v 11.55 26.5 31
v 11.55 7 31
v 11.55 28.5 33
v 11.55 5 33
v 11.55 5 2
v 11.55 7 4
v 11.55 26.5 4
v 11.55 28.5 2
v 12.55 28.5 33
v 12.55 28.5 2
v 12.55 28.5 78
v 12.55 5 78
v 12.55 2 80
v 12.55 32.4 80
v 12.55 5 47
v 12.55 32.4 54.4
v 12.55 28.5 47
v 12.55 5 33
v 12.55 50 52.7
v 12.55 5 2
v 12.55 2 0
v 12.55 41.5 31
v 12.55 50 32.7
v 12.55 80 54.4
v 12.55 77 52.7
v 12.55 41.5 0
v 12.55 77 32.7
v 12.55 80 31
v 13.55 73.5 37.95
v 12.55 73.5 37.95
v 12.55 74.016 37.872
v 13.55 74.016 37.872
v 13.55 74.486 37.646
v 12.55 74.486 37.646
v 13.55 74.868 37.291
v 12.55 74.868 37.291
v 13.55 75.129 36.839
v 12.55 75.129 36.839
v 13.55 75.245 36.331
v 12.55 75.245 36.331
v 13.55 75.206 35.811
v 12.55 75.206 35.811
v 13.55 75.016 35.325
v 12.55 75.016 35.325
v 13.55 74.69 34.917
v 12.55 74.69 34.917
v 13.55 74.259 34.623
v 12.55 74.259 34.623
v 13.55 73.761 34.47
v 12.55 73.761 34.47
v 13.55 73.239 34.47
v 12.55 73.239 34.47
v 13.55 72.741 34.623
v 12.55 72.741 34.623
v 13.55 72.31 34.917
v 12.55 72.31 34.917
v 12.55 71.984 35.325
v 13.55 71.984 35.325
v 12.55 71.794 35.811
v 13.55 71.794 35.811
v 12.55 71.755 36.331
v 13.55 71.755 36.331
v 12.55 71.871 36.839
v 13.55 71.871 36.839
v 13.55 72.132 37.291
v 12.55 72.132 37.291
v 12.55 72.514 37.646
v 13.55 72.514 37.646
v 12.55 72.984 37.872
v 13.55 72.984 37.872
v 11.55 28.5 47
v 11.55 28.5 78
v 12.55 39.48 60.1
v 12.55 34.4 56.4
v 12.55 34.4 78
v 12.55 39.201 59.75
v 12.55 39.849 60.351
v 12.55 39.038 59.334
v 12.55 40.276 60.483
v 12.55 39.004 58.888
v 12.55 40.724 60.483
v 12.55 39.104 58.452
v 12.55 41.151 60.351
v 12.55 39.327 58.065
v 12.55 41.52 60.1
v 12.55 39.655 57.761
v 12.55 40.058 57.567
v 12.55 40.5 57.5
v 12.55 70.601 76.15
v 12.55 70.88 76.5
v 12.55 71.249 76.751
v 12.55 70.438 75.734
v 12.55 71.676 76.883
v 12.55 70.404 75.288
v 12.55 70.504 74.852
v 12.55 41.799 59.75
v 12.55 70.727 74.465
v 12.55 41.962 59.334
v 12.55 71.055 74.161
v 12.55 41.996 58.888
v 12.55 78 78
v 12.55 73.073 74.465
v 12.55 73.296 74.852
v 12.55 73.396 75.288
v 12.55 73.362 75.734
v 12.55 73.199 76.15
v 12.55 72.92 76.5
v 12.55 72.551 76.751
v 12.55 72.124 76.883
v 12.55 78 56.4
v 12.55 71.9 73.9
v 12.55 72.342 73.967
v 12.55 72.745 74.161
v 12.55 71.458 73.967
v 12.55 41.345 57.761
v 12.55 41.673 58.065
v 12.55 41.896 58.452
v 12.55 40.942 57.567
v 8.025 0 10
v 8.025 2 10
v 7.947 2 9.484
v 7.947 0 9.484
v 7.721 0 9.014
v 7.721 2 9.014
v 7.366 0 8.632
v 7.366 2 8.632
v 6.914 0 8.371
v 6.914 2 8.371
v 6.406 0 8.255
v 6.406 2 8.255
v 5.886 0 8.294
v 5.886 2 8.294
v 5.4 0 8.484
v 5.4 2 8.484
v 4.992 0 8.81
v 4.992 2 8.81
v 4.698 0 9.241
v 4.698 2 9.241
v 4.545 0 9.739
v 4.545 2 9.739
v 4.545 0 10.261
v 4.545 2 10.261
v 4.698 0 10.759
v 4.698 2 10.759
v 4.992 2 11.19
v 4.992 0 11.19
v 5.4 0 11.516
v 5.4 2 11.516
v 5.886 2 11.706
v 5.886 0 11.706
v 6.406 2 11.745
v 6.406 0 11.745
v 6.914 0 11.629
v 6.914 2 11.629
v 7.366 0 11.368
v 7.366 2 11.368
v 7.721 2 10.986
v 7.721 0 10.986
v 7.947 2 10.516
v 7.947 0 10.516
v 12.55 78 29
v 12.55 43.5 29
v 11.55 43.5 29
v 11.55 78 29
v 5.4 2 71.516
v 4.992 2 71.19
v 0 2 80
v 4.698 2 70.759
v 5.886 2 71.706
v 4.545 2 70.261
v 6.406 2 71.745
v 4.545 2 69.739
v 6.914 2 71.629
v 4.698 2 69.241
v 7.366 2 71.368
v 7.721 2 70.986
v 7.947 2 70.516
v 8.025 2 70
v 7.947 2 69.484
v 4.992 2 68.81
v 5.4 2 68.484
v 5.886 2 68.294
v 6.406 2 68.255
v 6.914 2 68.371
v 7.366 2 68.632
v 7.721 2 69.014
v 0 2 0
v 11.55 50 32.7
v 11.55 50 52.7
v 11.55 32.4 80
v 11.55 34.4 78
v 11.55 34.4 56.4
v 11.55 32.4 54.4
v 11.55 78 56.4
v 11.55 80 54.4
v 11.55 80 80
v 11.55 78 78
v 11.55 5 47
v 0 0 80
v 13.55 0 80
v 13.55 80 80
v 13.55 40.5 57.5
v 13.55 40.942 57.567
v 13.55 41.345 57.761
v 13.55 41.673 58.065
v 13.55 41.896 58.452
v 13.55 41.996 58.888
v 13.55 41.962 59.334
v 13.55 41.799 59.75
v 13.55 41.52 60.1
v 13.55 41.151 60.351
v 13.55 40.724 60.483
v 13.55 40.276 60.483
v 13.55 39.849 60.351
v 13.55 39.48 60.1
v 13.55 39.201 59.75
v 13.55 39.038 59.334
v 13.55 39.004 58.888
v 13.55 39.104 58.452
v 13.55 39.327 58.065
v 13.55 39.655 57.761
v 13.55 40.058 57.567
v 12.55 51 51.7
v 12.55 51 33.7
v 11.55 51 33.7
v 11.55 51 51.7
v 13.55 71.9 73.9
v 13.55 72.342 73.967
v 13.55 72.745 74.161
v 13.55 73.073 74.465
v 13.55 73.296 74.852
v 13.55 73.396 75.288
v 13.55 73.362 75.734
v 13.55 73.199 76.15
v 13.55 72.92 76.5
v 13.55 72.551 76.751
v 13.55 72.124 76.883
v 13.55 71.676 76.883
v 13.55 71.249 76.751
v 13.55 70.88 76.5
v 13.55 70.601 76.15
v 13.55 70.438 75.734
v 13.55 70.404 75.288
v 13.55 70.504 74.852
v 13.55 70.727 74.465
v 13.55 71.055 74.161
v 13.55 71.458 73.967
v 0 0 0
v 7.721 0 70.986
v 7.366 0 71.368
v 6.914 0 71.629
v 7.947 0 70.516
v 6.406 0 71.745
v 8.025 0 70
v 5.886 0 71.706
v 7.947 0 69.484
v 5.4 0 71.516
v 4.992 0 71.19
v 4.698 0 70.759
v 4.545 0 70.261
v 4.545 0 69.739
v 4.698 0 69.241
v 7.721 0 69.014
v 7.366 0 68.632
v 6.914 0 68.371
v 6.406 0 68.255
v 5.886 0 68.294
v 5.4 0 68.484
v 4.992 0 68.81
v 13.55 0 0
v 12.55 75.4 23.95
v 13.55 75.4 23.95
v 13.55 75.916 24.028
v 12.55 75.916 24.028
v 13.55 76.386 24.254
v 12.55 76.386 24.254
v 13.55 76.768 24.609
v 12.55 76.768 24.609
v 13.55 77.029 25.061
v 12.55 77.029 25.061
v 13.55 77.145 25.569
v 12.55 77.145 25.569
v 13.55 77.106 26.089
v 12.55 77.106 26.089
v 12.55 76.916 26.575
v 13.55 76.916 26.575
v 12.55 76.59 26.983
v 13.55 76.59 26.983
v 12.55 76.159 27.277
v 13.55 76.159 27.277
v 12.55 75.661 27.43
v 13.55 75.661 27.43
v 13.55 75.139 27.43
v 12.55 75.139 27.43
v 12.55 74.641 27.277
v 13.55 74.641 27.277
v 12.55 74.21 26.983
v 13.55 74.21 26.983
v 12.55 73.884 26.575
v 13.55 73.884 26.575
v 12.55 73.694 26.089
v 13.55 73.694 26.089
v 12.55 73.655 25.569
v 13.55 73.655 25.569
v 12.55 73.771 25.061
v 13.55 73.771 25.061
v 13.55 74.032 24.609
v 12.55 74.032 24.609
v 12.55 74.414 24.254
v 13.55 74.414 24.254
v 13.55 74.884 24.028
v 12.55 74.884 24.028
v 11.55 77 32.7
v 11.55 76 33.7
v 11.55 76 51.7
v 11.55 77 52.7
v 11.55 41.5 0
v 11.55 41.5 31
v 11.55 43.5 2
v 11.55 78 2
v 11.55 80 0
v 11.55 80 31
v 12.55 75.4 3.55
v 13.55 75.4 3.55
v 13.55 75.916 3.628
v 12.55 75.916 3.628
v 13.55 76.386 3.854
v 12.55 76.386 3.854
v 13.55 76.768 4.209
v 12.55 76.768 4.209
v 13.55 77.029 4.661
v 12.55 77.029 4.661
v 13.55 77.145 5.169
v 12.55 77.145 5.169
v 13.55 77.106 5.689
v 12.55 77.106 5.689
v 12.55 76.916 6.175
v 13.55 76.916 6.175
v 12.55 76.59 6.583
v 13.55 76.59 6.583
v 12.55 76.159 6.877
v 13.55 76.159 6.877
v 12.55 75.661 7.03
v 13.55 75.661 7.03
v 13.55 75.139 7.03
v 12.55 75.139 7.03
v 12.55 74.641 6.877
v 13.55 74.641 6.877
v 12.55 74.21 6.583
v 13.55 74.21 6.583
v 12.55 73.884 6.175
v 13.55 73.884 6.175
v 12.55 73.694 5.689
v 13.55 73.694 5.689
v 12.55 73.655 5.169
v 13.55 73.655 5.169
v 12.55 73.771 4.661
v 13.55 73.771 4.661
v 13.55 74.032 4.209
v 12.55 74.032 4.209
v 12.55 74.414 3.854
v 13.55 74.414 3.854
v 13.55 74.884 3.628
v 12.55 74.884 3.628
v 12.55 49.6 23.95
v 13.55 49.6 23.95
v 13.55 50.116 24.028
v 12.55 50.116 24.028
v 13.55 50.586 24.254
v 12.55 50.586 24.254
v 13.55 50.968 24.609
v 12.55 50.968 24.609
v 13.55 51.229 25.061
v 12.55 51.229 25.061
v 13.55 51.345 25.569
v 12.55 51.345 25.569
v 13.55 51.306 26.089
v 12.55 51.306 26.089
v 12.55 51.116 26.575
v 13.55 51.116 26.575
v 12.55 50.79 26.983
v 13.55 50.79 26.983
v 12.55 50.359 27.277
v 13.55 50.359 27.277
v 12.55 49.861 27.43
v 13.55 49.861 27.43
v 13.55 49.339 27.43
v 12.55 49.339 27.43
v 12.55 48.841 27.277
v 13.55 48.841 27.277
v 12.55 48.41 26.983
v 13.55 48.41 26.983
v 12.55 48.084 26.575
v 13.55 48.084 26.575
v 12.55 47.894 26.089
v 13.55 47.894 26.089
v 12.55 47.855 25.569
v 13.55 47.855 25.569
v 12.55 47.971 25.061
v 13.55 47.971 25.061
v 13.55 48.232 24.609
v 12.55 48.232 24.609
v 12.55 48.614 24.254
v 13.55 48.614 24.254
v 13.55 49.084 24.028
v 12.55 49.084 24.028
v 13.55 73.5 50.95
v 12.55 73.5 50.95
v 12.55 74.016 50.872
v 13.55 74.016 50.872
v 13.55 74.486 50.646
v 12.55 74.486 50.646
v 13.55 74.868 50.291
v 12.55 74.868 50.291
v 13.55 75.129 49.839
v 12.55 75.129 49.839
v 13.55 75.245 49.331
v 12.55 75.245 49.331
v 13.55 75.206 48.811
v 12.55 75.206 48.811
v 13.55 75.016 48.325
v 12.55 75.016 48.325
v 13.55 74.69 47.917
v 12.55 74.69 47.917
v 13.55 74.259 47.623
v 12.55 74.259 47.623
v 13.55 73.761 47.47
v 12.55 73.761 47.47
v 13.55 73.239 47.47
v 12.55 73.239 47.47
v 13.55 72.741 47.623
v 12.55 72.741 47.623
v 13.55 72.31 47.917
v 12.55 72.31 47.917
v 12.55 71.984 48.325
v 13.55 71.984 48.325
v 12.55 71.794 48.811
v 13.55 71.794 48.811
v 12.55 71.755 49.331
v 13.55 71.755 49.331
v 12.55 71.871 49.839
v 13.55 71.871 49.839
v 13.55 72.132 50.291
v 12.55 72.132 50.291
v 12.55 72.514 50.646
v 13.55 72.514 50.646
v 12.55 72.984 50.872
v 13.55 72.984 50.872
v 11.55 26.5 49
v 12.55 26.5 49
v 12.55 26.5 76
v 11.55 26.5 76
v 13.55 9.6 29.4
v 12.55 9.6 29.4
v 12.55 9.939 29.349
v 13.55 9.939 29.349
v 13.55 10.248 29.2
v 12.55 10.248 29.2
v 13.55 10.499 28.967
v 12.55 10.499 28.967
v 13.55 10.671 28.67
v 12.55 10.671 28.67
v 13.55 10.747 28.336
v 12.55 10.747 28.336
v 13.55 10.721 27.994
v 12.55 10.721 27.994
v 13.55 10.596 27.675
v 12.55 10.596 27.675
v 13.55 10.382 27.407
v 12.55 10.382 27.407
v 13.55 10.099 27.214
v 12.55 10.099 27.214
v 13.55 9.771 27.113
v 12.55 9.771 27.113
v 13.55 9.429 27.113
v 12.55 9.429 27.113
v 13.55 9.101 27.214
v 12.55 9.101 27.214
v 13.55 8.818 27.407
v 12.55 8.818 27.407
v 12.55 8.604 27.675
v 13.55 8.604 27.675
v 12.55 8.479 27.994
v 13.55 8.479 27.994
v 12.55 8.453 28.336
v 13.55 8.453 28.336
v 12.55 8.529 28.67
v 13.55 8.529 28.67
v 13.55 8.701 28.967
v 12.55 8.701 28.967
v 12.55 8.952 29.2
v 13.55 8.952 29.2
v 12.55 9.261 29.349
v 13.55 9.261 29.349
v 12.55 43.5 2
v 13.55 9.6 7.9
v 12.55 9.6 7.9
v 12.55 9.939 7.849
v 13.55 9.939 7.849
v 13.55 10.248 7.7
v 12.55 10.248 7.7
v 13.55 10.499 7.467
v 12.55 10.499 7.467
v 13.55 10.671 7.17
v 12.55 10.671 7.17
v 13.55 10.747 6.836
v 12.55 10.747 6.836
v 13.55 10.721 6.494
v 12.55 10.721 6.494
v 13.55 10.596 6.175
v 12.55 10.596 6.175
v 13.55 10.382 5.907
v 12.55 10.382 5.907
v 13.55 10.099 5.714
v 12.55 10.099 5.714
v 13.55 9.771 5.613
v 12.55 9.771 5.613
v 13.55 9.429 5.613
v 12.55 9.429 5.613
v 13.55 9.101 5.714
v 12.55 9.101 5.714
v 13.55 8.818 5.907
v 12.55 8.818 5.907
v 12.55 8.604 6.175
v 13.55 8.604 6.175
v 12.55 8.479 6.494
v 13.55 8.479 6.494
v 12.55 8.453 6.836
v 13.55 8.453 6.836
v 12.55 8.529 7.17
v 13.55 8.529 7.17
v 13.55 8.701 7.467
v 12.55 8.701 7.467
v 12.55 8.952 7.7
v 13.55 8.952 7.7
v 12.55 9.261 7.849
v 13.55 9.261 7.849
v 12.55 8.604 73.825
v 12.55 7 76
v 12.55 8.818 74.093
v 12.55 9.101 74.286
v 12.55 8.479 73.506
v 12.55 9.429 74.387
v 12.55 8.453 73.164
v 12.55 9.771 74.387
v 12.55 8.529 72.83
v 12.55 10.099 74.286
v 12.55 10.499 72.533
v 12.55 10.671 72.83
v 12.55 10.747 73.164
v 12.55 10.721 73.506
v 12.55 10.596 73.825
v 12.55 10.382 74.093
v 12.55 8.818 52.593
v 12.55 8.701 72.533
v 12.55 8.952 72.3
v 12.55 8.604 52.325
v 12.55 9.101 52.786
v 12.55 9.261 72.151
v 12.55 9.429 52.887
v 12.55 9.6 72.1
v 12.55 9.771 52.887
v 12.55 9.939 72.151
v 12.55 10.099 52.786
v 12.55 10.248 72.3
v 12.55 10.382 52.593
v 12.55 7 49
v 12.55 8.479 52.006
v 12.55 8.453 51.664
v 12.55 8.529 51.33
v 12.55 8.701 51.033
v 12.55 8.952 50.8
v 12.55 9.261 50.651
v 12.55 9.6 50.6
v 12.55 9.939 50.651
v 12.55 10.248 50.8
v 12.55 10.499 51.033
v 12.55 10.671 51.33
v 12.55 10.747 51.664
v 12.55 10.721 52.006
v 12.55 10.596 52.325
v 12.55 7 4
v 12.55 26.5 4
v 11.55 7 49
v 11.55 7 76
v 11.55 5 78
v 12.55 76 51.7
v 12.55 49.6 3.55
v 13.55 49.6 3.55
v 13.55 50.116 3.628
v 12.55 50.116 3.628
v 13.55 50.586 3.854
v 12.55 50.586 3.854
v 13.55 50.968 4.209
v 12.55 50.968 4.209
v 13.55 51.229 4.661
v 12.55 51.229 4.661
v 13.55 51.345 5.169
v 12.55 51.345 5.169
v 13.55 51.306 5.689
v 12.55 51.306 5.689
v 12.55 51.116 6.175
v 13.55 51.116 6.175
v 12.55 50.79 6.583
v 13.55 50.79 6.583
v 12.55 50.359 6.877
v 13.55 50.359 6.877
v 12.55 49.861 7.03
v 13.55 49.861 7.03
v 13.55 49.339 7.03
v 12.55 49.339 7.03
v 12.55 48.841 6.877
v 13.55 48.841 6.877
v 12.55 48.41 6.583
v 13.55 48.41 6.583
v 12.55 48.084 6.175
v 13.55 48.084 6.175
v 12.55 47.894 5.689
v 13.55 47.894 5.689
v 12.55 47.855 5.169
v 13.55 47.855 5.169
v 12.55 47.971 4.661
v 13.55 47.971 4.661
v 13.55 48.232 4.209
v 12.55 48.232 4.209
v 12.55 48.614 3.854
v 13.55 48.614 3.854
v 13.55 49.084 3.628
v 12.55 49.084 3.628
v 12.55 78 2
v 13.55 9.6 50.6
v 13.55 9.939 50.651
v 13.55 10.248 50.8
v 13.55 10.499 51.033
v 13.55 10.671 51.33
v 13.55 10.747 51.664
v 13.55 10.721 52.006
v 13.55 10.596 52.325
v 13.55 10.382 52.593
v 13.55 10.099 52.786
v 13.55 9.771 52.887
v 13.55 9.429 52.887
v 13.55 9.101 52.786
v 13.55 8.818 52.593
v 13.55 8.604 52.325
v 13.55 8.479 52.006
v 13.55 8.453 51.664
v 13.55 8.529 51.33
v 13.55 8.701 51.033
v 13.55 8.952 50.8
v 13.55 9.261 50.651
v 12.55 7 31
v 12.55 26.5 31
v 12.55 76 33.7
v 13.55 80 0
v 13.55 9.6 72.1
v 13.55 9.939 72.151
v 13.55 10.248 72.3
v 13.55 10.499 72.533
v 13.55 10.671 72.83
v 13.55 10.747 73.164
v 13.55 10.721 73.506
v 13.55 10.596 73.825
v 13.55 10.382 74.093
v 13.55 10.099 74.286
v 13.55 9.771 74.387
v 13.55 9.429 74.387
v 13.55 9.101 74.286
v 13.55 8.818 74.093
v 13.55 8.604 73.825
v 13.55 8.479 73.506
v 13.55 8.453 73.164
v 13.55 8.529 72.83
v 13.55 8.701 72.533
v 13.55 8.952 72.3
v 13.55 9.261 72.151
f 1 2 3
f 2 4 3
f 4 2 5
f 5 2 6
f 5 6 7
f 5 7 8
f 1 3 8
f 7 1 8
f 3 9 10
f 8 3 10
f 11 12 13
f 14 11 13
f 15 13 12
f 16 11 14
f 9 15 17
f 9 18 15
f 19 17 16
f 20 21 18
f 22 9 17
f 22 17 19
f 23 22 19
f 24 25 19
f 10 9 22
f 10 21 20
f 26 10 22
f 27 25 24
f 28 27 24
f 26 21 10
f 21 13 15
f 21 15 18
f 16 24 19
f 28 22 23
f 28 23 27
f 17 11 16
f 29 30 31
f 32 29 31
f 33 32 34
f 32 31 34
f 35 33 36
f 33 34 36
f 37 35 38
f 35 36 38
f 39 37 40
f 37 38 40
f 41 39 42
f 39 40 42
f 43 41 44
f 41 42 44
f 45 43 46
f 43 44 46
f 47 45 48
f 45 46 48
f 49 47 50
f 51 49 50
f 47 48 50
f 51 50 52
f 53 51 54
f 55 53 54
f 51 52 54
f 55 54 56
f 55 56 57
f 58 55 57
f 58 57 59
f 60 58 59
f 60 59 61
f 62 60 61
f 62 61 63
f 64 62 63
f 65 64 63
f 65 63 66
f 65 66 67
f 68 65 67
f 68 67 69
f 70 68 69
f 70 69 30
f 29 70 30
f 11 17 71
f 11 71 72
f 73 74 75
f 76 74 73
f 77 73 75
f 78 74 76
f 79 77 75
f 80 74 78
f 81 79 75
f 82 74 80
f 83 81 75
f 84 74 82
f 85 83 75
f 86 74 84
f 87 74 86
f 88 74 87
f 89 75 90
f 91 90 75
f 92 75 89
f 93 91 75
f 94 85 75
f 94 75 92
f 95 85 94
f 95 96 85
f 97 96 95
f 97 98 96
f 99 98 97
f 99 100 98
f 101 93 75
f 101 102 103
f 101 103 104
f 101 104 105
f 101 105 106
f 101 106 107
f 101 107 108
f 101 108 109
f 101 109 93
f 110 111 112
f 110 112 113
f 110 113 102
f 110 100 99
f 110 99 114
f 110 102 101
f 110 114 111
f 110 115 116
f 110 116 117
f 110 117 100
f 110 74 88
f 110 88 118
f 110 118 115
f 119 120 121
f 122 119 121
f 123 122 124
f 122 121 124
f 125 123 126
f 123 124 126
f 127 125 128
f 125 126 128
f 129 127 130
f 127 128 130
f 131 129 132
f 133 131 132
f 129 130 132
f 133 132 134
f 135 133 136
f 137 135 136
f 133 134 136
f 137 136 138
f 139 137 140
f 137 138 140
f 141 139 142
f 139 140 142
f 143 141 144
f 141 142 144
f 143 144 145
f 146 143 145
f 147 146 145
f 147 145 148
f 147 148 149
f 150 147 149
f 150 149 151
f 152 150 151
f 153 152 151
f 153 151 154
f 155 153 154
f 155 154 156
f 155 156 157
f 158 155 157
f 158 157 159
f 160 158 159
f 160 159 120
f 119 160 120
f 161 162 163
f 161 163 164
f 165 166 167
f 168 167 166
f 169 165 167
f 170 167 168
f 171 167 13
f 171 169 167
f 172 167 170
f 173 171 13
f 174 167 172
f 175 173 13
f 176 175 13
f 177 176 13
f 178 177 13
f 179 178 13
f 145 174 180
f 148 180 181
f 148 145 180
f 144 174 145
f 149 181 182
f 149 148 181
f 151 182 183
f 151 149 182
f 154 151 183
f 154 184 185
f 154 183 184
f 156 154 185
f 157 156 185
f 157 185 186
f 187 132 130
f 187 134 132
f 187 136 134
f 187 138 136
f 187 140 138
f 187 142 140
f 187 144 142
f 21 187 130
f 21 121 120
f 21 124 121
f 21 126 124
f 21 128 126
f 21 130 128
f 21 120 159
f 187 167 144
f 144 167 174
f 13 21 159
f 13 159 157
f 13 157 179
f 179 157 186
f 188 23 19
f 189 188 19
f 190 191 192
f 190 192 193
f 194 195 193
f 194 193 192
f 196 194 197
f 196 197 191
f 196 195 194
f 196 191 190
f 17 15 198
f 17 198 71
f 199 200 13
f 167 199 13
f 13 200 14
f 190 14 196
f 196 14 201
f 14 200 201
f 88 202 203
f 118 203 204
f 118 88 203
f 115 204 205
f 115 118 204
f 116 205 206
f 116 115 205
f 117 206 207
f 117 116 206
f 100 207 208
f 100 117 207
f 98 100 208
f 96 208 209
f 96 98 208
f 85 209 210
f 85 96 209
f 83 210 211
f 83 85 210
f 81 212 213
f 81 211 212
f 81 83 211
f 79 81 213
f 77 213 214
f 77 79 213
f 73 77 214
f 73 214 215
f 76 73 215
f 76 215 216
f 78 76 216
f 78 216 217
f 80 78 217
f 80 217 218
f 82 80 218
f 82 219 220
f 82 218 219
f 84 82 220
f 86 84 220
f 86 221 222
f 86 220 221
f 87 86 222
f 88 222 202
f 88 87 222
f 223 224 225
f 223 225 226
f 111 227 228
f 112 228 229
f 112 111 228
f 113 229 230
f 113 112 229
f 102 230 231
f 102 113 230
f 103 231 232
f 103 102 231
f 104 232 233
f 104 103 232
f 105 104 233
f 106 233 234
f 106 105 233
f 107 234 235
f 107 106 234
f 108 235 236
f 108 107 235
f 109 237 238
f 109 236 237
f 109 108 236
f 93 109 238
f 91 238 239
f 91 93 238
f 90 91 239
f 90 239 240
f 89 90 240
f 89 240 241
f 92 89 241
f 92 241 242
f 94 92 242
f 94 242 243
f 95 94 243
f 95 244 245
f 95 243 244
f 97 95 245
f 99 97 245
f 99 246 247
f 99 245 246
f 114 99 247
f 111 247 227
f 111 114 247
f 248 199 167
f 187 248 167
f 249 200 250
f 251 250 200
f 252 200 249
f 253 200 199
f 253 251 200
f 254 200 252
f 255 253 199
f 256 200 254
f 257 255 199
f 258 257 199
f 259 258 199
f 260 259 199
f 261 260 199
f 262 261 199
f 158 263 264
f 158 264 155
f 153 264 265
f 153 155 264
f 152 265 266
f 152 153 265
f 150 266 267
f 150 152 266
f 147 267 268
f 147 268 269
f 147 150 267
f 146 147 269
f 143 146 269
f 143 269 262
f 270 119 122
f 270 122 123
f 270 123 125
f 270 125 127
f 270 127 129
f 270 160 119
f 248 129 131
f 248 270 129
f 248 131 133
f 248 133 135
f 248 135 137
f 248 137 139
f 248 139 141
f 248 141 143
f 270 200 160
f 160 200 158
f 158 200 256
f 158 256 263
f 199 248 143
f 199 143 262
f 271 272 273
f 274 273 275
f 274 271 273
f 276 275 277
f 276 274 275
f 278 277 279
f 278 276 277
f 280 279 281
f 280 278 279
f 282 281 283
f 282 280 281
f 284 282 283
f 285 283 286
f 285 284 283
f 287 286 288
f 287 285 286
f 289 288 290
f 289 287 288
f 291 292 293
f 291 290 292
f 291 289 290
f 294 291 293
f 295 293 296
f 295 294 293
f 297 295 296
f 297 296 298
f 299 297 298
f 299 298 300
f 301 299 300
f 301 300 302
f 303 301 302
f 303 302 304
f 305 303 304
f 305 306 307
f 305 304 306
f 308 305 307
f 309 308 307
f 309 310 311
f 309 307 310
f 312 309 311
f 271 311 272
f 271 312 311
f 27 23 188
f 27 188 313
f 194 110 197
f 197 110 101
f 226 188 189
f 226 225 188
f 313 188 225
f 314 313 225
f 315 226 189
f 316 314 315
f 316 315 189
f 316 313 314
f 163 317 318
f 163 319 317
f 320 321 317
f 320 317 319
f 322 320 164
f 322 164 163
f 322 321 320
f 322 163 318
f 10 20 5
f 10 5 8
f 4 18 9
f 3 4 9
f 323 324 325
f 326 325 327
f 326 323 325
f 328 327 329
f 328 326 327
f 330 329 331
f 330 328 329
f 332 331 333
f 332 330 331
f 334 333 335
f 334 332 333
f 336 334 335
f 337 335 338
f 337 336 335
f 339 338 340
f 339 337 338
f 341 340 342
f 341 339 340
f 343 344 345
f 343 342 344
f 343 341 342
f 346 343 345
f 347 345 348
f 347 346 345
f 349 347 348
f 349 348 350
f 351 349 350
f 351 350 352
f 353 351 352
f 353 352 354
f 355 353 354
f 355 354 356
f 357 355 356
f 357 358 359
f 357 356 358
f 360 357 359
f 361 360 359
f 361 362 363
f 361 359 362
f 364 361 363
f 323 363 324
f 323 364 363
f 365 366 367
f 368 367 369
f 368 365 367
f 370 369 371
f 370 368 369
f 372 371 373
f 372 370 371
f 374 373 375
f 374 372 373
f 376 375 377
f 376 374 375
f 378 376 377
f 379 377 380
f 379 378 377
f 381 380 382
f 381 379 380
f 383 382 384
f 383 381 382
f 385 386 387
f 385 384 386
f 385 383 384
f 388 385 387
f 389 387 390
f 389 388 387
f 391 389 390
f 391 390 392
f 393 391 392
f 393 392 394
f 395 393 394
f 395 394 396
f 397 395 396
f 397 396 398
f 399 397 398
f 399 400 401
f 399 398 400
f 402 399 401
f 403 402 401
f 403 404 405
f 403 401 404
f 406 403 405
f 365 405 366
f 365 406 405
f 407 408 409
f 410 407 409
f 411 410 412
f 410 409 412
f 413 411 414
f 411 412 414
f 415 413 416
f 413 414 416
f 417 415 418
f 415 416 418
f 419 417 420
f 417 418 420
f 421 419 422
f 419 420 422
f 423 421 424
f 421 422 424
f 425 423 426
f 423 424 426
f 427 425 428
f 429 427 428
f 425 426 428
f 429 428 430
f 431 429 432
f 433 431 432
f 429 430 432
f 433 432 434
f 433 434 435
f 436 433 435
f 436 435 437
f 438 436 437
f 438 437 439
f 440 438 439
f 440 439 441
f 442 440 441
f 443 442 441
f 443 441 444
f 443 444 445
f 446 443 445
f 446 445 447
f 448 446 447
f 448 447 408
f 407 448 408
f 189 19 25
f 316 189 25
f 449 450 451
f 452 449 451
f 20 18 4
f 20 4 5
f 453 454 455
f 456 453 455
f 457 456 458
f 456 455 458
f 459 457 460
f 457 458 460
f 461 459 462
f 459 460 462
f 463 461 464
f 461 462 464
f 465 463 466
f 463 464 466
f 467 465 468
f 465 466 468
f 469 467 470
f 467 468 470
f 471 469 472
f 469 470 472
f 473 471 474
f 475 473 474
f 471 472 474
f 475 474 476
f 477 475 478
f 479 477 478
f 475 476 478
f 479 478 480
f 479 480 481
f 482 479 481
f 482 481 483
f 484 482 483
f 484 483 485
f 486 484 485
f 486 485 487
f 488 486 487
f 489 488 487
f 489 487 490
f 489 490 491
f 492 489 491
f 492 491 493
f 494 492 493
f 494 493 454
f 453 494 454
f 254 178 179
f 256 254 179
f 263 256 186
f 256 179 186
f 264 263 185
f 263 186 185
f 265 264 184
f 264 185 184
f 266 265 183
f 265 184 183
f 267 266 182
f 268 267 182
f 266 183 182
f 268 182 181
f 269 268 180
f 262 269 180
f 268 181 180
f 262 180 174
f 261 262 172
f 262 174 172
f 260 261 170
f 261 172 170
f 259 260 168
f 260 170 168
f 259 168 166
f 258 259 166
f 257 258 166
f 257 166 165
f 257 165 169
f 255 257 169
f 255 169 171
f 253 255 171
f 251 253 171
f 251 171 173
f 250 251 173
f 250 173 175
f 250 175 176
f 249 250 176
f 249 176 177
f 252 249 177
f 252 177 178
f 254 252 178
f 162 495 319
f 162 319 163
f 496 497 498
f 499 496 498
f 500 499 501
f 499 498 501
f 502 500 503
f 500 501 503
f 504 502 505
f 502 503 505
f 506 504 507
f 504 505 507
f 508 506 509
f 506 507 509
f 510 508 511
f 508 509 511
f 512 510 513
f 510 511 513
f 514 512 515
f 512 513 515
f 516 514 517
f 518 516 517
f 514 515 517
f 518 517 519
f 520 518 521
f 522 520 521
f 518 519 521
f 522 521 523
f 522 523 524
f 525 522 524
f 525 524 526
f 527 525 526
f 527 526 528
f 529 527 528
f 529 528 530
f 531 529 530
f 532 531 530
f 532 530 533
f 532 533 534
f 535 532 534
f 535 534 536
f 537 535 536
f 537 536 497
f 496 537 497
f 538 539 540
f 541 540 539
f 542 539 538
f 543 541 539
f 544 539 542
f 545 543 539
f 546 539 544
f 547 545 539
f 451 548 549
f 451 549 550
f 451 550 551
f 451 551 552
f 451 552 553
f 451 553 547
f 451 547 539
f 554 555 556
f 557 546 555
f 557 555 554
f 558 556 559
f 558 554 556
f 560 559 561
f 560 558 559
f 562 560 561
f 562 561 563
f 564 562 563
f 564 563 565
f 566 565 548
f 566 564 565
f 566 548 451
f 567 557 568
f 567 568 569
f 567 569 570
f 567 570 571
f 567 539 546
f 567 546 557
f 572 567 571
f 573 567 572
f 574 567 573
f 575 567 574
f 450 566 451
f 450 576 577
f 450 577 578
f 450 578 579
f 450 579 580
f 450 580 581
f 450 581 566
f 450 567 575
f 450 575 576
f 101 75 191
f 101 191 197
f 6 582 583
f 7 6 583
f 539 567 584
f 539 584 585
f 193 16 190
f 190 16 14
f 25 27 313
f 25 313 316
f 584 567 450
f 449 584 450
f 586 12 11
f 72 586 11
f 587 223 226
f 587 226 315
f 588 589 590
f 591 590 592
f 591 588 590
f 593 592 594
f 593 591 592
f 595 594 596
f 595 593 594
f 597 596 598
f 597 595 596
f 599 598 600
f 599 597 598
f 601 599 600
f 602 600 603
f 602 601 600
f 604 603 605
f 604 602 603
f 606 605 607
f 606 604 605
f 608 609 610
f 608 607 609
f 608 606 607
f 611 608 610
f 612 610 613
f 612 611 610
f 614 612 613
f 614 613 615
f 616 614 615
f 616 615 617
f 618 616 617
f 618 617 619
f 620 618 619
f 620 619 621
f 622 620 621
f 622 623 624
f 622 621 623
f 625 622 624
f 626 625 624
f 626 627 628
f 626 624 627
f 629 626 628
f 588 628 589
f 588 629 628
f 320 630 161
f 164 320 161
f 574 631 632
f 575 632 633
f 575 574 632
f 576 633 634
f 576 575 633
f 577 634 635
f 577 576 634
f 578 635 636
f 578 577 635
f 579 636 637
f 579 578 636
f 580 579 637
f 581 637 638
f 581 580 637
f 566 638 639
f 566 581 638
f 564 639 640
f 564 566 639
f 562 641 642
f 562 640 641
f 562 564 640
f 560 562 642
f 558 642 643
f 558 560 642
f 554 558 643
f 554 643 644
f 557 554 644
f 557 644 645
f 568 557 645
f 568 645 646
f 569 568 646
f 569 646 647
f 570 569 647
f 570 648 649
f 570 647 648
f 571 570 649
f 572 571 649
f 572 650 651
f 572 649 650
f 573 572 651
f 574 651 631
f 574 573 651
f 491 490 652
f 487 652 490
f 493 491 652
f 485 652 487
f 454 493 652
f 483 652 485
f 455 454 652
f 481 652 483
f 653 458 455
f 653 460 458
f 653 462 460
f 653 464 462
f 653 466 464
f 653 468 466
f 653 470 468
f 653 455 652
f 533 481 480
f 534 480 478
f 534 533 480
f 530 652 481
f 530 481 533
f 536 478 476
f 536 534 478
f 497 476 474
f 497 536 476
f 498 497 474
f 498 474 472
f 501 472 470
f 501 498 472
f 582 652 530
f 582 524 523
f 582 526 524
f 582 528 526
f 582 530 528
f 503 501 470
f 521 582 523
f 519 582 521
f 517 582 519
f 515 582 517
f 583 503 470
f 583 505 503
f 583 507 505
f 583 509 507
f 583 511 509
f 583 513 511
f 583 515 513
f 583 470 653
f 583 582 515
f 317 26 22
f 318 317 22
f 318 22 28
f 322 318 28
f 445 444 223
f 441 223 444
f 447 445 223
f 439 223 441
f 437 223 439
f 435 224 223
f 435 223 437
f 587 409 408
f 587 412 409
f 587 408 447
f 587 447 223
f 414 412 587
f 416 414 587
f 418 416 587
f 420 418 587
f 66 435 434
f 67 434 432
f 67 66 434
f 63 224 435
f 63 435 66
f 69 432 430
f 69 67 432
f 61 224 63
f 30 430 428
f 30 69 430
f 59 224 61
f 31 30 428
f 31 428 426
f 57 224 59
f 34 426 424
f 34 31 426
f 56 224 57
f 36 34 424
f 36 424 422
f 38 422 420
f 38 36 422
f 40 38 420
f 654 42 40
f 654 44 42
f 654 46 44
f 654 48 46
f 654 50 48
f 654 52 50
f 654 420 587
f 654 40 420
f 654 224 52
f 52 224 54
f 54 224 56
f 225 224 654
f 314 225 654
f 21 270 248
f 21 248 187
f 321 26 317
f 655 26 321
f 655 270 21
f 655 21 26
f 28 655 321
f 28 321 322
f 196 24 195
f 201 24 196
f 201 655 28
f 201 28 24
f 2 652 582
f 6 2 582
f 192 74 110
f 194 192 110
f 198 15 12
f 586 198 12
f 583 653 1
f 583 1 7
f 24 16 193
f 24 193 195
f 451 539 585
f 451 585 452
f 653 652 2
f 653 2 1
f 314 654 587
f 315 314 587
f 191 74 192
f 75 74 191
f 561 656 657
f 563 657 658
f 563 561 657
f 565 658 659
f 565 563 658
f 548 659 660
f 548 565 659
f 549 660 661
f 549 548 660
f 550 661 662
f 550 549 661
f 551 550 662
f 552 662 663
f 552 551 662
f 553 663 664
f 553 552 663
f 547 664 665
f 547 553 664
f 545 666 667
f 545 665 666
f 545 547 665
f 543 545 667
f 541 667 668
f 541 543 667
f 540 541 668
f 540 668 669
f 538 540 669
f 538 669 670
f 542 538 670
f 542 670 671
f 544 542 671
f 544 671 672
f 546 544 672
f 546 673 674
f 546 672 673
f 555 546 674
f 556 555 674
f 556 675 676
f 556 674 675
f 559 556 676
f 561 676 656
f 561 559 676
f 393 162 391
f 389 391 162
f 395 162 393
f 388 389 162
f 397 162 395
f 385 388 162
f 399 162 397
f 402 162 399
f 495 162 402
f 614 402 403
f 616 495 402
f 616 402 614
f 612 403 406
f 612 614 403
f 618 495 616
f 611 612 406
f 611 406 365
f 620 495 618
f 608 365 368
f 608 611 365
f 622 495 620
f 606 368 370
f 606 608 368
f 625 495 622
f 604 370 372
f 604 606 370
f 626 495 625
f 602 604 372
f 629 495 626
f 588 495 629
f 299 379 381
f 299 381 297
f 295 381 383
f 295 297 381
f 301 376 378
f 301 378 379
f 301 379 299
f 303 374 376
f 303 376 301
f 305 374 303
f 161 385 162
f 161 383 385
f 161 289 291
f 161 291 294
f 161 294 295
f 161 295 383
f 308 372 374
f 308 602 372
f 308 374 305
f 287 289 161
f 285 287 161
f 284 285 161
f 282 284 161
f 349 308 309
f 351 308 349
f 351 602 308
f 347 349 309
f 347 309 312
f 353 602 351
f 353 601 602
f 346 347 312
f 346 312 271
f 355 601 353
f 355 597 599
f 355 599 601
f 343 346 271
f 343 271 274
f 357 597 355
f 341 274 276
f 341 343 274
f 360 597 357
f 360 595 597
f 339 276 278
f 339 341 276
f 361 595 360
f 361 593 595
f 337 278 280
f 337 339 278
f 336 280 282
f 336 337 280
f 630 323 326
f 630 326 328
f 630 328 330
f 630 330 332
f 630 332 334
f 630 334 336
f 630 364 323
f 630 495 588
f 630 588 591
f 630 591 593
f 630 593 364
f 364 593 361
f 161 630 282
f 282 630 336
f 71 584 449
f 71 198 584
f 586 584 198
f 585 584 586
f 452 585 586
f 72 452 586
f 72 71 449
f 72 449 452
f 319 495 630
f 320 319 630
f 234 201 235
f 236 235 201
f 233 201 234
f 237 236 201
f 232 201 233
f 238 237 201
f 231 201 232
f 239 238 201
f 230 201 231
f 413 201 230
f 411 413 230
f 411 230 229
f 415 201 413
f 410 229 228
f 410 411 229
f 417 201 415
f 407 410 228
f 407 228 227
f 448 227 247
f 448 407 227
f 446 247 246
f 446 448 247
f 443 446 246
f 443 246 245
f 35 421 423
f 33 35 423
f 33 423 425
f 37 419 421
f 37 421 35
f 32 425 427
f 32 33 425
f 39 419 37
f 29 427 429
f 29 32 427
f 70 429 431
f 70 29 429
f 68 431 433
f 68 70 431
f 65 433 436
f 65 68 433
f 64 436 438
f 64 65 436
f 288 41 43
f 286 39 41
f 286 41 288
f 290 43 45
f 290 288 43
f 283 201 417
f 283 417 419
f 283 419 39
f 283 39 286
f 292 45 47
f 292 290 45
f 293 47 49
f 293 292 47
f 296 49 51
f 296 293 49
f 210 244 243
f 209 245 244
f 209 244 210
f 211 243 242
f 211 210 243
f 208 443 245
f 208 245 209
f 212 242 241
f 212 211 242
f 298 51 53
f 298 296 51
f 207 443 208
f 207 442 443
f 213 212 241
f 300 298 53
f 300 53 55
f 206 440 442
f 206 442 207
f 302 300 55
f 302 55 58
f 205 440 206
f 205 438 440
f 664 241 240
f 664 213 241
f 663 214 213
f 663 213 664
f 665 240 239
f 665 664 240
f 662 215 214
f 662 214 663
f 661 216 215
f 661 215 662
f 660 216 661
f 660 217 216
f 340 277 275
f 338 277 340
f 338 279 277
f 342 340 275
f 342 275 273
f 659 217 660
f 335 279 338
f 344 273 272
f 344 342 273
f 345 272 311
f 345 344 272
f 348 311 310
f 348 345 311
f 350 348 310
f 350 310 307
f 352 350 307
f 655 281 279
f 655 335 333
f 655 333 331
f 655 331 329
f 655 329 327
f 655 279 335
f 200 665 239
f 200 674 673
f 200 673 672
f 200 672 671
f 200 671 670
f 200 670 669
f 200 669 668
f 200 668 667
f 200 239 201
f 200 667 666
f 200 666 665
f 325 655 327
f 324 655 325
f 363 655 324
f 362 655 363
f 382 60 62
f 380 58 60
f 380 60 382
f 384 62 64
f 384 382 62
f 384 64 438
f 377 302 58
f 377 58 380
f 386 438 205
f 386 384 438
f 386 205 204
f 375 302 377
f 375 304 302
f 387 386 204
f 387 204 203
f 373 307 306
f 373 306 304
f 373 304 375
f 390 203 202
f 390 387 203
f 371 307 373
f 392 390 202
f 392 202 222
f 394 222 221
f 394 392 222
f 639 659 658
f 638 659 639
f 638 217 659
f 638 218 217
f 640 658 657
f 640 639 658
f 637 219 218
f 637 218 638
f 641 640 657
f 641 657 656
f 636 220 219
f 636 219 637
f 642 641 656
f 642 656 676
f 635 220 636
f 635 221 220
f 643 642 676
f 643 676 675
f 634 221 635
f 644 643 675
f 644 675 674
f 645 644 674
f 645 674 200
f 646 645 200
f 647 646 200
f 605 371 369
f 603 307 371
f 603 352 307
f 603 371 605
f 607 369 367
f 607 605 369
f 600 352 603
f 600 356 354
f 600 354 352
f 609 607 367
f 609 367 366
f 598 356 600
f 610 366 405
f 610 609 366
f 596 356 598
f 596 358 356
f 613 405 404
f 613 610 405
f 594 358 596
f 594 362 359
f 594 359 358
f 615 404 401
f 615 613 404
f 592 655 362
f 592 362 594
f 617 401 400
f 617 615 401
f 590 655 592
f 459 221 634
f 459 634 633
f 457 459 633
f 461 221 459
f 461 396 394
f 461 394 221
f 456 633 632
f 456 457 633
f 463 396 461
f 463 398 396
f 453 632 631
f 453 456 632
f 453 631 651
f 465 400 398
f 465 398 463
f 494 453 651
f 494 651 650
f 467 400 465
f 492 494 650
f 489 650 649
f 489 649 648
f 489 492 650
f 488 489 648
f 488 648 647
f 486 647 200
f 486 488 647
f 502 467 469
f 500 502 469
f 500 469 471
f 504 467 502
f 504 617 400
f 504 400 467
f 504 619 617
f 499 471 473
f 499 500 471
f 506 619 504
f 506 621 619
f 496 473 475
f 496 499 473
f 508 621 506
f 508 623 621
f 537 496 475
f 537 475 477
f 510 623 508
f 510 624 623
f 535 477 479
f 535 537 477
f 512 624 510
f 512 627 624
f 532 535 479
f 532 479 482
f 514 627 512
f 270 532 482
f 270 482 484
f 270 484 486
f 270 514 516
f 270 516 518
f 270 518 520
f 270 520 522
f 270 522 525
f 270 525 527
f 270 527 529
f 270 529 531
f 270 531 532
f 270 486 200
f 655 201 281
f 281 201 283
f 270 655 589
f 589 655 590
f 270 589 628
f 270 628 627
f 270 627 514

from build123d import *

# Parameters (mm, degrees)
BASE_DEPTH               = 80
SCREW_HOLES_BASE_REACH   = 4
SKETCH3_R                = 1.75
SKETCH6_W                = 31
SKETCH6_H                = 38.5
SKETCH6_W_2              = 27
SKETCH6_H_2              = 34.5
S2MINI_DEPTH             = 1
SKETCH8_R                = 1.75
SCREW_HOLES_S2MINI_DEPTH = 10
SKETCH10_W               = 31
SKETCH10_H               = 23.5
SKETCH10_W_2             = 27
SKETCH10_H_2             = 19.5
MD_DEPTH                 = 1
SKETCH12_R               = 1.15
SCREW_HOLES_MD_DEPTH     = 10
SKETCH14_W               = 25.6
SKETCH14_H               = 47.6
SKETCH14_W_2             = 21.6
SKETCH14_H_2             = 43.6
BC_DEPTH                 = 1
SKETCH16_R               = 1.5
SCREW_HOLES_BC_DEPTH     = 10
SKETCH17_W               = 20
SKETCH17_H               = 27
SKETCH17_W_2             = 18
SKETCH17_H_2             = 25
LA_DEPTH                 = 1
CUT_EXTRUDE6_REACH       = 3
SKETCH18_R               = 1.75


with BuildPart() as part:
    # Sketch1 → Base (new body)
    with BuildSketch(Plane.XY):
        Polygon((0, 0), (0, 2), (12.55, 2), (12.55, 80), (13.55, 80), (13.55, 0), align=None)
    extrude(amount=BASE_DEPTH)

    # Sketch3 → Screw_Holes_Base (cut, up to next)
    with BuildSketch(Plane(origin=(0, 2, 0), x_dir=(1, 0, 0), z_dir=(0, 1, 0)), mode=Mode.PRIVATE) as screw_holes_base_sk1:
        with Locations((6.275, -10)):
            Circle(SKETCH3_R)
    screw_holes_base_tool1 = extrude(screw_holes_base_sk1.sketch, amount=-SCREW_HOLES_BASE_REACH, mode=Mode.PRIVATE) & part.part
    add(screw_holes_base_tool1.solids().sort_by_distance((6.275, 2, 10))[0], mode=Mode.SUBTRACT)
    # Sketch3 → Screw_Holes_Base (cut, up to next)
    with BuildSketch(Plane(origin=(0, 2, 0), x_dir=(1, 0, 0), z_dir=(0, 1, 0)), mode=Mode.PRIVATE) as screw_holes_base_sk2:
        with Locations((6.275, -70)):
            Circle(SKETCH3_R)
    screw_holes_base_tool2 = extrude(screw_holes_base_sk2.sketch, amount=-SCREW_HOLES_BASE_REACH, mode=Mode.PRIVATE) & part.part
    add(screw_holes_base_tool2.solids().sort_by_distance((6.275, 2, 70))[0], mode=Mode.SUBTRACT)

    # Sketch6 → S2Mini (add)
    with BuildSketch(Plane(origin=(12.55, -16.871702151, -147.313128111), x_dir=(0, 0, 1), z_dir=(-1, 0, 0))):
        with Locations((162.813128111, 77.621702151)):
            Rectangle(SKETCH6_W, SKETCH6_H)
        with Locations((162.813128111, 77.621702151)):
            Rectangle(SKETCH6_W_2, SKETCH6_H_2, mode=Mode.SUBTRACT)
    extrude(amount=S2MINI_DEPTH)

    # Sketch8 → Screw_Holes_S2Mini (cut)
    with BuildSketch(Plane(origin=(12.55, 0, 13.55), x_dir=(0, 0, -1), z_dir=(1, 0, 0))):
        with Locations((-12.15, 75.4)):
            Circle(SKETCH8_R)
        with Locations((8.25, 75.4)):
            Circle(SKETCH8_R)
        with Locations((-12.15, 49.6)):
            Circle(SKETCH8_R)
        with Locations((8.25, 49.6)):
            Circle(SKETCH8_R)
    extrude(amount=SCREW_HOLES_S2MINI_DEPTH, mode=Mode.SUBTRACT)

    # Sketch10 → MD (add)
    with BuildSketch(Plane(origin=(12.55, 37.151538962, -62.266989531), x_dir=(0, 0, 1), z_dir=(-1, 0, 0))):
        with Locations((124.766989531, -20.401538962)):
            Rectangle(SKETCH10_W, SKETCH10_H)
        with Locations((124.766989531, -20.401538962)):
            Rectangle(SKETCH10_W_2, SKETCH10_H_2, mode=Mode.SUBTRACT)
    md = extrude(amount=MD_DEPTH)

    # Sketch12 → Screw_Holes_MD (cut)
    with BuildSketch(Plane(origin=(12.55, 0, 13.55), x_dir=(0, 0, -1), z_dir=(1, 0, 0))):
        with Locations((-59.7, 9.6)):
            Circle(SKETCH12_R)
        with Locations((-38.2, 9.6)):
            Circle(SKETCH12_R)
    screw_holes_md = extrude(amount=SCREW_HOLES_MD_DEPTH, mode=Mode.SUBTRACT)

    # Mirror1: MD, Screw_Holes_MD across plane
    add(md.mirror(Plane.XY.offset(40)))
    add(screw_holes_md.mirror(Plane.XY.offset(40)), mode=Mode.SUBTRACT)

    # Sketch14 → BC (add)
    with BuildSketch(Plane(origin=(12.55, 28.832330024, -107.15387648), x_dir=(0, 0, 1), z_dir=(-1, 0, 0))):
        with Locations((174.35387648, 27.367669976)):
            Rectangle(SKETCH14_W, SKETCH14_H)
        with Locations((174.35387648, 27.367669976)):
            Rectangle(SKETCH14_W_2, SKETCH14_H_2, mode=Mode.SUBTRACT)
    extrude(amount=BC_DEPTH)

    # Sketch16 → Screw_Holes_BC (cut)
    with BuildSketch(Plane(origin=(12.55, 0, 13.55), x_dir=(0, 0, -1), z_dir=(1, 0, 0))):
        with Locations((-45.45, 40.5)):
            Circle(SKETCH16_R)
        with Locations((-61.85, 71.9)):
            Circle(SKETCH16_R)
    extrude(amount=SCREW_HOLES_BC_DEPTH, mode=Mode.SUBTRACT)

    # Sketch17 → LA (add)
    with BuildSketch(Plane.ZY.offset(-12.55)):
        with Locations((42.7, 63.5)):
            Rectangle(SKETCH17_W, SKETCH17_H)
        with Locations((42.7, 63.5)):
            Rectangle(SKETCH17_W_2, SKETCH17_H_2, mode=Mode.SUBTRACT)
    extrude(amount=LA_DEPTH)

    # Sketch18 → Cut-Extrude6 (cut, up to next)
    with BuildSketch(Plane.ZY.offset(-12.55), mode=Mode.PRIVATE) as cut_extrude6_sk1:
        with Locations((36.2, 73.5)):
            Circle(SKETCH18_R)
    cut_extrude6_tool1 = extrude(cut_extrude6_sk1.sketch, amount=-CUT_EXTRUDE6_REACH, mode=Mode.PRIVATE) & part.part
    add(cut_extrude6_tool1.solids().sort_by_distance((12.55, 73.5, 36.2))[0], mode=Mode.SUBTRACT)
    # Sketch18 → Cut-Extrude6 (cut, up to next)
    with BuildSketch(Plane.ZY.offset(-12.55), mode=Mode.PRIVATE) as cut_extrude6_sk2:
        with Locations((49.2, 73.5)):
            Circle(SKETCH18_R)
    cut_extrude6_tool2 = extrude(cut_extrude6_sk2.sketch, amount=-CUT_EXTRUDE6_REACH, mode=Mode.PRIVATE) & part.part
    add(cut_extrude6_tool2.solids().sort_by_distance((12.55, 73.5, 49.2))[0], mode=Mode.SUBTRACT)


solid = part.part
